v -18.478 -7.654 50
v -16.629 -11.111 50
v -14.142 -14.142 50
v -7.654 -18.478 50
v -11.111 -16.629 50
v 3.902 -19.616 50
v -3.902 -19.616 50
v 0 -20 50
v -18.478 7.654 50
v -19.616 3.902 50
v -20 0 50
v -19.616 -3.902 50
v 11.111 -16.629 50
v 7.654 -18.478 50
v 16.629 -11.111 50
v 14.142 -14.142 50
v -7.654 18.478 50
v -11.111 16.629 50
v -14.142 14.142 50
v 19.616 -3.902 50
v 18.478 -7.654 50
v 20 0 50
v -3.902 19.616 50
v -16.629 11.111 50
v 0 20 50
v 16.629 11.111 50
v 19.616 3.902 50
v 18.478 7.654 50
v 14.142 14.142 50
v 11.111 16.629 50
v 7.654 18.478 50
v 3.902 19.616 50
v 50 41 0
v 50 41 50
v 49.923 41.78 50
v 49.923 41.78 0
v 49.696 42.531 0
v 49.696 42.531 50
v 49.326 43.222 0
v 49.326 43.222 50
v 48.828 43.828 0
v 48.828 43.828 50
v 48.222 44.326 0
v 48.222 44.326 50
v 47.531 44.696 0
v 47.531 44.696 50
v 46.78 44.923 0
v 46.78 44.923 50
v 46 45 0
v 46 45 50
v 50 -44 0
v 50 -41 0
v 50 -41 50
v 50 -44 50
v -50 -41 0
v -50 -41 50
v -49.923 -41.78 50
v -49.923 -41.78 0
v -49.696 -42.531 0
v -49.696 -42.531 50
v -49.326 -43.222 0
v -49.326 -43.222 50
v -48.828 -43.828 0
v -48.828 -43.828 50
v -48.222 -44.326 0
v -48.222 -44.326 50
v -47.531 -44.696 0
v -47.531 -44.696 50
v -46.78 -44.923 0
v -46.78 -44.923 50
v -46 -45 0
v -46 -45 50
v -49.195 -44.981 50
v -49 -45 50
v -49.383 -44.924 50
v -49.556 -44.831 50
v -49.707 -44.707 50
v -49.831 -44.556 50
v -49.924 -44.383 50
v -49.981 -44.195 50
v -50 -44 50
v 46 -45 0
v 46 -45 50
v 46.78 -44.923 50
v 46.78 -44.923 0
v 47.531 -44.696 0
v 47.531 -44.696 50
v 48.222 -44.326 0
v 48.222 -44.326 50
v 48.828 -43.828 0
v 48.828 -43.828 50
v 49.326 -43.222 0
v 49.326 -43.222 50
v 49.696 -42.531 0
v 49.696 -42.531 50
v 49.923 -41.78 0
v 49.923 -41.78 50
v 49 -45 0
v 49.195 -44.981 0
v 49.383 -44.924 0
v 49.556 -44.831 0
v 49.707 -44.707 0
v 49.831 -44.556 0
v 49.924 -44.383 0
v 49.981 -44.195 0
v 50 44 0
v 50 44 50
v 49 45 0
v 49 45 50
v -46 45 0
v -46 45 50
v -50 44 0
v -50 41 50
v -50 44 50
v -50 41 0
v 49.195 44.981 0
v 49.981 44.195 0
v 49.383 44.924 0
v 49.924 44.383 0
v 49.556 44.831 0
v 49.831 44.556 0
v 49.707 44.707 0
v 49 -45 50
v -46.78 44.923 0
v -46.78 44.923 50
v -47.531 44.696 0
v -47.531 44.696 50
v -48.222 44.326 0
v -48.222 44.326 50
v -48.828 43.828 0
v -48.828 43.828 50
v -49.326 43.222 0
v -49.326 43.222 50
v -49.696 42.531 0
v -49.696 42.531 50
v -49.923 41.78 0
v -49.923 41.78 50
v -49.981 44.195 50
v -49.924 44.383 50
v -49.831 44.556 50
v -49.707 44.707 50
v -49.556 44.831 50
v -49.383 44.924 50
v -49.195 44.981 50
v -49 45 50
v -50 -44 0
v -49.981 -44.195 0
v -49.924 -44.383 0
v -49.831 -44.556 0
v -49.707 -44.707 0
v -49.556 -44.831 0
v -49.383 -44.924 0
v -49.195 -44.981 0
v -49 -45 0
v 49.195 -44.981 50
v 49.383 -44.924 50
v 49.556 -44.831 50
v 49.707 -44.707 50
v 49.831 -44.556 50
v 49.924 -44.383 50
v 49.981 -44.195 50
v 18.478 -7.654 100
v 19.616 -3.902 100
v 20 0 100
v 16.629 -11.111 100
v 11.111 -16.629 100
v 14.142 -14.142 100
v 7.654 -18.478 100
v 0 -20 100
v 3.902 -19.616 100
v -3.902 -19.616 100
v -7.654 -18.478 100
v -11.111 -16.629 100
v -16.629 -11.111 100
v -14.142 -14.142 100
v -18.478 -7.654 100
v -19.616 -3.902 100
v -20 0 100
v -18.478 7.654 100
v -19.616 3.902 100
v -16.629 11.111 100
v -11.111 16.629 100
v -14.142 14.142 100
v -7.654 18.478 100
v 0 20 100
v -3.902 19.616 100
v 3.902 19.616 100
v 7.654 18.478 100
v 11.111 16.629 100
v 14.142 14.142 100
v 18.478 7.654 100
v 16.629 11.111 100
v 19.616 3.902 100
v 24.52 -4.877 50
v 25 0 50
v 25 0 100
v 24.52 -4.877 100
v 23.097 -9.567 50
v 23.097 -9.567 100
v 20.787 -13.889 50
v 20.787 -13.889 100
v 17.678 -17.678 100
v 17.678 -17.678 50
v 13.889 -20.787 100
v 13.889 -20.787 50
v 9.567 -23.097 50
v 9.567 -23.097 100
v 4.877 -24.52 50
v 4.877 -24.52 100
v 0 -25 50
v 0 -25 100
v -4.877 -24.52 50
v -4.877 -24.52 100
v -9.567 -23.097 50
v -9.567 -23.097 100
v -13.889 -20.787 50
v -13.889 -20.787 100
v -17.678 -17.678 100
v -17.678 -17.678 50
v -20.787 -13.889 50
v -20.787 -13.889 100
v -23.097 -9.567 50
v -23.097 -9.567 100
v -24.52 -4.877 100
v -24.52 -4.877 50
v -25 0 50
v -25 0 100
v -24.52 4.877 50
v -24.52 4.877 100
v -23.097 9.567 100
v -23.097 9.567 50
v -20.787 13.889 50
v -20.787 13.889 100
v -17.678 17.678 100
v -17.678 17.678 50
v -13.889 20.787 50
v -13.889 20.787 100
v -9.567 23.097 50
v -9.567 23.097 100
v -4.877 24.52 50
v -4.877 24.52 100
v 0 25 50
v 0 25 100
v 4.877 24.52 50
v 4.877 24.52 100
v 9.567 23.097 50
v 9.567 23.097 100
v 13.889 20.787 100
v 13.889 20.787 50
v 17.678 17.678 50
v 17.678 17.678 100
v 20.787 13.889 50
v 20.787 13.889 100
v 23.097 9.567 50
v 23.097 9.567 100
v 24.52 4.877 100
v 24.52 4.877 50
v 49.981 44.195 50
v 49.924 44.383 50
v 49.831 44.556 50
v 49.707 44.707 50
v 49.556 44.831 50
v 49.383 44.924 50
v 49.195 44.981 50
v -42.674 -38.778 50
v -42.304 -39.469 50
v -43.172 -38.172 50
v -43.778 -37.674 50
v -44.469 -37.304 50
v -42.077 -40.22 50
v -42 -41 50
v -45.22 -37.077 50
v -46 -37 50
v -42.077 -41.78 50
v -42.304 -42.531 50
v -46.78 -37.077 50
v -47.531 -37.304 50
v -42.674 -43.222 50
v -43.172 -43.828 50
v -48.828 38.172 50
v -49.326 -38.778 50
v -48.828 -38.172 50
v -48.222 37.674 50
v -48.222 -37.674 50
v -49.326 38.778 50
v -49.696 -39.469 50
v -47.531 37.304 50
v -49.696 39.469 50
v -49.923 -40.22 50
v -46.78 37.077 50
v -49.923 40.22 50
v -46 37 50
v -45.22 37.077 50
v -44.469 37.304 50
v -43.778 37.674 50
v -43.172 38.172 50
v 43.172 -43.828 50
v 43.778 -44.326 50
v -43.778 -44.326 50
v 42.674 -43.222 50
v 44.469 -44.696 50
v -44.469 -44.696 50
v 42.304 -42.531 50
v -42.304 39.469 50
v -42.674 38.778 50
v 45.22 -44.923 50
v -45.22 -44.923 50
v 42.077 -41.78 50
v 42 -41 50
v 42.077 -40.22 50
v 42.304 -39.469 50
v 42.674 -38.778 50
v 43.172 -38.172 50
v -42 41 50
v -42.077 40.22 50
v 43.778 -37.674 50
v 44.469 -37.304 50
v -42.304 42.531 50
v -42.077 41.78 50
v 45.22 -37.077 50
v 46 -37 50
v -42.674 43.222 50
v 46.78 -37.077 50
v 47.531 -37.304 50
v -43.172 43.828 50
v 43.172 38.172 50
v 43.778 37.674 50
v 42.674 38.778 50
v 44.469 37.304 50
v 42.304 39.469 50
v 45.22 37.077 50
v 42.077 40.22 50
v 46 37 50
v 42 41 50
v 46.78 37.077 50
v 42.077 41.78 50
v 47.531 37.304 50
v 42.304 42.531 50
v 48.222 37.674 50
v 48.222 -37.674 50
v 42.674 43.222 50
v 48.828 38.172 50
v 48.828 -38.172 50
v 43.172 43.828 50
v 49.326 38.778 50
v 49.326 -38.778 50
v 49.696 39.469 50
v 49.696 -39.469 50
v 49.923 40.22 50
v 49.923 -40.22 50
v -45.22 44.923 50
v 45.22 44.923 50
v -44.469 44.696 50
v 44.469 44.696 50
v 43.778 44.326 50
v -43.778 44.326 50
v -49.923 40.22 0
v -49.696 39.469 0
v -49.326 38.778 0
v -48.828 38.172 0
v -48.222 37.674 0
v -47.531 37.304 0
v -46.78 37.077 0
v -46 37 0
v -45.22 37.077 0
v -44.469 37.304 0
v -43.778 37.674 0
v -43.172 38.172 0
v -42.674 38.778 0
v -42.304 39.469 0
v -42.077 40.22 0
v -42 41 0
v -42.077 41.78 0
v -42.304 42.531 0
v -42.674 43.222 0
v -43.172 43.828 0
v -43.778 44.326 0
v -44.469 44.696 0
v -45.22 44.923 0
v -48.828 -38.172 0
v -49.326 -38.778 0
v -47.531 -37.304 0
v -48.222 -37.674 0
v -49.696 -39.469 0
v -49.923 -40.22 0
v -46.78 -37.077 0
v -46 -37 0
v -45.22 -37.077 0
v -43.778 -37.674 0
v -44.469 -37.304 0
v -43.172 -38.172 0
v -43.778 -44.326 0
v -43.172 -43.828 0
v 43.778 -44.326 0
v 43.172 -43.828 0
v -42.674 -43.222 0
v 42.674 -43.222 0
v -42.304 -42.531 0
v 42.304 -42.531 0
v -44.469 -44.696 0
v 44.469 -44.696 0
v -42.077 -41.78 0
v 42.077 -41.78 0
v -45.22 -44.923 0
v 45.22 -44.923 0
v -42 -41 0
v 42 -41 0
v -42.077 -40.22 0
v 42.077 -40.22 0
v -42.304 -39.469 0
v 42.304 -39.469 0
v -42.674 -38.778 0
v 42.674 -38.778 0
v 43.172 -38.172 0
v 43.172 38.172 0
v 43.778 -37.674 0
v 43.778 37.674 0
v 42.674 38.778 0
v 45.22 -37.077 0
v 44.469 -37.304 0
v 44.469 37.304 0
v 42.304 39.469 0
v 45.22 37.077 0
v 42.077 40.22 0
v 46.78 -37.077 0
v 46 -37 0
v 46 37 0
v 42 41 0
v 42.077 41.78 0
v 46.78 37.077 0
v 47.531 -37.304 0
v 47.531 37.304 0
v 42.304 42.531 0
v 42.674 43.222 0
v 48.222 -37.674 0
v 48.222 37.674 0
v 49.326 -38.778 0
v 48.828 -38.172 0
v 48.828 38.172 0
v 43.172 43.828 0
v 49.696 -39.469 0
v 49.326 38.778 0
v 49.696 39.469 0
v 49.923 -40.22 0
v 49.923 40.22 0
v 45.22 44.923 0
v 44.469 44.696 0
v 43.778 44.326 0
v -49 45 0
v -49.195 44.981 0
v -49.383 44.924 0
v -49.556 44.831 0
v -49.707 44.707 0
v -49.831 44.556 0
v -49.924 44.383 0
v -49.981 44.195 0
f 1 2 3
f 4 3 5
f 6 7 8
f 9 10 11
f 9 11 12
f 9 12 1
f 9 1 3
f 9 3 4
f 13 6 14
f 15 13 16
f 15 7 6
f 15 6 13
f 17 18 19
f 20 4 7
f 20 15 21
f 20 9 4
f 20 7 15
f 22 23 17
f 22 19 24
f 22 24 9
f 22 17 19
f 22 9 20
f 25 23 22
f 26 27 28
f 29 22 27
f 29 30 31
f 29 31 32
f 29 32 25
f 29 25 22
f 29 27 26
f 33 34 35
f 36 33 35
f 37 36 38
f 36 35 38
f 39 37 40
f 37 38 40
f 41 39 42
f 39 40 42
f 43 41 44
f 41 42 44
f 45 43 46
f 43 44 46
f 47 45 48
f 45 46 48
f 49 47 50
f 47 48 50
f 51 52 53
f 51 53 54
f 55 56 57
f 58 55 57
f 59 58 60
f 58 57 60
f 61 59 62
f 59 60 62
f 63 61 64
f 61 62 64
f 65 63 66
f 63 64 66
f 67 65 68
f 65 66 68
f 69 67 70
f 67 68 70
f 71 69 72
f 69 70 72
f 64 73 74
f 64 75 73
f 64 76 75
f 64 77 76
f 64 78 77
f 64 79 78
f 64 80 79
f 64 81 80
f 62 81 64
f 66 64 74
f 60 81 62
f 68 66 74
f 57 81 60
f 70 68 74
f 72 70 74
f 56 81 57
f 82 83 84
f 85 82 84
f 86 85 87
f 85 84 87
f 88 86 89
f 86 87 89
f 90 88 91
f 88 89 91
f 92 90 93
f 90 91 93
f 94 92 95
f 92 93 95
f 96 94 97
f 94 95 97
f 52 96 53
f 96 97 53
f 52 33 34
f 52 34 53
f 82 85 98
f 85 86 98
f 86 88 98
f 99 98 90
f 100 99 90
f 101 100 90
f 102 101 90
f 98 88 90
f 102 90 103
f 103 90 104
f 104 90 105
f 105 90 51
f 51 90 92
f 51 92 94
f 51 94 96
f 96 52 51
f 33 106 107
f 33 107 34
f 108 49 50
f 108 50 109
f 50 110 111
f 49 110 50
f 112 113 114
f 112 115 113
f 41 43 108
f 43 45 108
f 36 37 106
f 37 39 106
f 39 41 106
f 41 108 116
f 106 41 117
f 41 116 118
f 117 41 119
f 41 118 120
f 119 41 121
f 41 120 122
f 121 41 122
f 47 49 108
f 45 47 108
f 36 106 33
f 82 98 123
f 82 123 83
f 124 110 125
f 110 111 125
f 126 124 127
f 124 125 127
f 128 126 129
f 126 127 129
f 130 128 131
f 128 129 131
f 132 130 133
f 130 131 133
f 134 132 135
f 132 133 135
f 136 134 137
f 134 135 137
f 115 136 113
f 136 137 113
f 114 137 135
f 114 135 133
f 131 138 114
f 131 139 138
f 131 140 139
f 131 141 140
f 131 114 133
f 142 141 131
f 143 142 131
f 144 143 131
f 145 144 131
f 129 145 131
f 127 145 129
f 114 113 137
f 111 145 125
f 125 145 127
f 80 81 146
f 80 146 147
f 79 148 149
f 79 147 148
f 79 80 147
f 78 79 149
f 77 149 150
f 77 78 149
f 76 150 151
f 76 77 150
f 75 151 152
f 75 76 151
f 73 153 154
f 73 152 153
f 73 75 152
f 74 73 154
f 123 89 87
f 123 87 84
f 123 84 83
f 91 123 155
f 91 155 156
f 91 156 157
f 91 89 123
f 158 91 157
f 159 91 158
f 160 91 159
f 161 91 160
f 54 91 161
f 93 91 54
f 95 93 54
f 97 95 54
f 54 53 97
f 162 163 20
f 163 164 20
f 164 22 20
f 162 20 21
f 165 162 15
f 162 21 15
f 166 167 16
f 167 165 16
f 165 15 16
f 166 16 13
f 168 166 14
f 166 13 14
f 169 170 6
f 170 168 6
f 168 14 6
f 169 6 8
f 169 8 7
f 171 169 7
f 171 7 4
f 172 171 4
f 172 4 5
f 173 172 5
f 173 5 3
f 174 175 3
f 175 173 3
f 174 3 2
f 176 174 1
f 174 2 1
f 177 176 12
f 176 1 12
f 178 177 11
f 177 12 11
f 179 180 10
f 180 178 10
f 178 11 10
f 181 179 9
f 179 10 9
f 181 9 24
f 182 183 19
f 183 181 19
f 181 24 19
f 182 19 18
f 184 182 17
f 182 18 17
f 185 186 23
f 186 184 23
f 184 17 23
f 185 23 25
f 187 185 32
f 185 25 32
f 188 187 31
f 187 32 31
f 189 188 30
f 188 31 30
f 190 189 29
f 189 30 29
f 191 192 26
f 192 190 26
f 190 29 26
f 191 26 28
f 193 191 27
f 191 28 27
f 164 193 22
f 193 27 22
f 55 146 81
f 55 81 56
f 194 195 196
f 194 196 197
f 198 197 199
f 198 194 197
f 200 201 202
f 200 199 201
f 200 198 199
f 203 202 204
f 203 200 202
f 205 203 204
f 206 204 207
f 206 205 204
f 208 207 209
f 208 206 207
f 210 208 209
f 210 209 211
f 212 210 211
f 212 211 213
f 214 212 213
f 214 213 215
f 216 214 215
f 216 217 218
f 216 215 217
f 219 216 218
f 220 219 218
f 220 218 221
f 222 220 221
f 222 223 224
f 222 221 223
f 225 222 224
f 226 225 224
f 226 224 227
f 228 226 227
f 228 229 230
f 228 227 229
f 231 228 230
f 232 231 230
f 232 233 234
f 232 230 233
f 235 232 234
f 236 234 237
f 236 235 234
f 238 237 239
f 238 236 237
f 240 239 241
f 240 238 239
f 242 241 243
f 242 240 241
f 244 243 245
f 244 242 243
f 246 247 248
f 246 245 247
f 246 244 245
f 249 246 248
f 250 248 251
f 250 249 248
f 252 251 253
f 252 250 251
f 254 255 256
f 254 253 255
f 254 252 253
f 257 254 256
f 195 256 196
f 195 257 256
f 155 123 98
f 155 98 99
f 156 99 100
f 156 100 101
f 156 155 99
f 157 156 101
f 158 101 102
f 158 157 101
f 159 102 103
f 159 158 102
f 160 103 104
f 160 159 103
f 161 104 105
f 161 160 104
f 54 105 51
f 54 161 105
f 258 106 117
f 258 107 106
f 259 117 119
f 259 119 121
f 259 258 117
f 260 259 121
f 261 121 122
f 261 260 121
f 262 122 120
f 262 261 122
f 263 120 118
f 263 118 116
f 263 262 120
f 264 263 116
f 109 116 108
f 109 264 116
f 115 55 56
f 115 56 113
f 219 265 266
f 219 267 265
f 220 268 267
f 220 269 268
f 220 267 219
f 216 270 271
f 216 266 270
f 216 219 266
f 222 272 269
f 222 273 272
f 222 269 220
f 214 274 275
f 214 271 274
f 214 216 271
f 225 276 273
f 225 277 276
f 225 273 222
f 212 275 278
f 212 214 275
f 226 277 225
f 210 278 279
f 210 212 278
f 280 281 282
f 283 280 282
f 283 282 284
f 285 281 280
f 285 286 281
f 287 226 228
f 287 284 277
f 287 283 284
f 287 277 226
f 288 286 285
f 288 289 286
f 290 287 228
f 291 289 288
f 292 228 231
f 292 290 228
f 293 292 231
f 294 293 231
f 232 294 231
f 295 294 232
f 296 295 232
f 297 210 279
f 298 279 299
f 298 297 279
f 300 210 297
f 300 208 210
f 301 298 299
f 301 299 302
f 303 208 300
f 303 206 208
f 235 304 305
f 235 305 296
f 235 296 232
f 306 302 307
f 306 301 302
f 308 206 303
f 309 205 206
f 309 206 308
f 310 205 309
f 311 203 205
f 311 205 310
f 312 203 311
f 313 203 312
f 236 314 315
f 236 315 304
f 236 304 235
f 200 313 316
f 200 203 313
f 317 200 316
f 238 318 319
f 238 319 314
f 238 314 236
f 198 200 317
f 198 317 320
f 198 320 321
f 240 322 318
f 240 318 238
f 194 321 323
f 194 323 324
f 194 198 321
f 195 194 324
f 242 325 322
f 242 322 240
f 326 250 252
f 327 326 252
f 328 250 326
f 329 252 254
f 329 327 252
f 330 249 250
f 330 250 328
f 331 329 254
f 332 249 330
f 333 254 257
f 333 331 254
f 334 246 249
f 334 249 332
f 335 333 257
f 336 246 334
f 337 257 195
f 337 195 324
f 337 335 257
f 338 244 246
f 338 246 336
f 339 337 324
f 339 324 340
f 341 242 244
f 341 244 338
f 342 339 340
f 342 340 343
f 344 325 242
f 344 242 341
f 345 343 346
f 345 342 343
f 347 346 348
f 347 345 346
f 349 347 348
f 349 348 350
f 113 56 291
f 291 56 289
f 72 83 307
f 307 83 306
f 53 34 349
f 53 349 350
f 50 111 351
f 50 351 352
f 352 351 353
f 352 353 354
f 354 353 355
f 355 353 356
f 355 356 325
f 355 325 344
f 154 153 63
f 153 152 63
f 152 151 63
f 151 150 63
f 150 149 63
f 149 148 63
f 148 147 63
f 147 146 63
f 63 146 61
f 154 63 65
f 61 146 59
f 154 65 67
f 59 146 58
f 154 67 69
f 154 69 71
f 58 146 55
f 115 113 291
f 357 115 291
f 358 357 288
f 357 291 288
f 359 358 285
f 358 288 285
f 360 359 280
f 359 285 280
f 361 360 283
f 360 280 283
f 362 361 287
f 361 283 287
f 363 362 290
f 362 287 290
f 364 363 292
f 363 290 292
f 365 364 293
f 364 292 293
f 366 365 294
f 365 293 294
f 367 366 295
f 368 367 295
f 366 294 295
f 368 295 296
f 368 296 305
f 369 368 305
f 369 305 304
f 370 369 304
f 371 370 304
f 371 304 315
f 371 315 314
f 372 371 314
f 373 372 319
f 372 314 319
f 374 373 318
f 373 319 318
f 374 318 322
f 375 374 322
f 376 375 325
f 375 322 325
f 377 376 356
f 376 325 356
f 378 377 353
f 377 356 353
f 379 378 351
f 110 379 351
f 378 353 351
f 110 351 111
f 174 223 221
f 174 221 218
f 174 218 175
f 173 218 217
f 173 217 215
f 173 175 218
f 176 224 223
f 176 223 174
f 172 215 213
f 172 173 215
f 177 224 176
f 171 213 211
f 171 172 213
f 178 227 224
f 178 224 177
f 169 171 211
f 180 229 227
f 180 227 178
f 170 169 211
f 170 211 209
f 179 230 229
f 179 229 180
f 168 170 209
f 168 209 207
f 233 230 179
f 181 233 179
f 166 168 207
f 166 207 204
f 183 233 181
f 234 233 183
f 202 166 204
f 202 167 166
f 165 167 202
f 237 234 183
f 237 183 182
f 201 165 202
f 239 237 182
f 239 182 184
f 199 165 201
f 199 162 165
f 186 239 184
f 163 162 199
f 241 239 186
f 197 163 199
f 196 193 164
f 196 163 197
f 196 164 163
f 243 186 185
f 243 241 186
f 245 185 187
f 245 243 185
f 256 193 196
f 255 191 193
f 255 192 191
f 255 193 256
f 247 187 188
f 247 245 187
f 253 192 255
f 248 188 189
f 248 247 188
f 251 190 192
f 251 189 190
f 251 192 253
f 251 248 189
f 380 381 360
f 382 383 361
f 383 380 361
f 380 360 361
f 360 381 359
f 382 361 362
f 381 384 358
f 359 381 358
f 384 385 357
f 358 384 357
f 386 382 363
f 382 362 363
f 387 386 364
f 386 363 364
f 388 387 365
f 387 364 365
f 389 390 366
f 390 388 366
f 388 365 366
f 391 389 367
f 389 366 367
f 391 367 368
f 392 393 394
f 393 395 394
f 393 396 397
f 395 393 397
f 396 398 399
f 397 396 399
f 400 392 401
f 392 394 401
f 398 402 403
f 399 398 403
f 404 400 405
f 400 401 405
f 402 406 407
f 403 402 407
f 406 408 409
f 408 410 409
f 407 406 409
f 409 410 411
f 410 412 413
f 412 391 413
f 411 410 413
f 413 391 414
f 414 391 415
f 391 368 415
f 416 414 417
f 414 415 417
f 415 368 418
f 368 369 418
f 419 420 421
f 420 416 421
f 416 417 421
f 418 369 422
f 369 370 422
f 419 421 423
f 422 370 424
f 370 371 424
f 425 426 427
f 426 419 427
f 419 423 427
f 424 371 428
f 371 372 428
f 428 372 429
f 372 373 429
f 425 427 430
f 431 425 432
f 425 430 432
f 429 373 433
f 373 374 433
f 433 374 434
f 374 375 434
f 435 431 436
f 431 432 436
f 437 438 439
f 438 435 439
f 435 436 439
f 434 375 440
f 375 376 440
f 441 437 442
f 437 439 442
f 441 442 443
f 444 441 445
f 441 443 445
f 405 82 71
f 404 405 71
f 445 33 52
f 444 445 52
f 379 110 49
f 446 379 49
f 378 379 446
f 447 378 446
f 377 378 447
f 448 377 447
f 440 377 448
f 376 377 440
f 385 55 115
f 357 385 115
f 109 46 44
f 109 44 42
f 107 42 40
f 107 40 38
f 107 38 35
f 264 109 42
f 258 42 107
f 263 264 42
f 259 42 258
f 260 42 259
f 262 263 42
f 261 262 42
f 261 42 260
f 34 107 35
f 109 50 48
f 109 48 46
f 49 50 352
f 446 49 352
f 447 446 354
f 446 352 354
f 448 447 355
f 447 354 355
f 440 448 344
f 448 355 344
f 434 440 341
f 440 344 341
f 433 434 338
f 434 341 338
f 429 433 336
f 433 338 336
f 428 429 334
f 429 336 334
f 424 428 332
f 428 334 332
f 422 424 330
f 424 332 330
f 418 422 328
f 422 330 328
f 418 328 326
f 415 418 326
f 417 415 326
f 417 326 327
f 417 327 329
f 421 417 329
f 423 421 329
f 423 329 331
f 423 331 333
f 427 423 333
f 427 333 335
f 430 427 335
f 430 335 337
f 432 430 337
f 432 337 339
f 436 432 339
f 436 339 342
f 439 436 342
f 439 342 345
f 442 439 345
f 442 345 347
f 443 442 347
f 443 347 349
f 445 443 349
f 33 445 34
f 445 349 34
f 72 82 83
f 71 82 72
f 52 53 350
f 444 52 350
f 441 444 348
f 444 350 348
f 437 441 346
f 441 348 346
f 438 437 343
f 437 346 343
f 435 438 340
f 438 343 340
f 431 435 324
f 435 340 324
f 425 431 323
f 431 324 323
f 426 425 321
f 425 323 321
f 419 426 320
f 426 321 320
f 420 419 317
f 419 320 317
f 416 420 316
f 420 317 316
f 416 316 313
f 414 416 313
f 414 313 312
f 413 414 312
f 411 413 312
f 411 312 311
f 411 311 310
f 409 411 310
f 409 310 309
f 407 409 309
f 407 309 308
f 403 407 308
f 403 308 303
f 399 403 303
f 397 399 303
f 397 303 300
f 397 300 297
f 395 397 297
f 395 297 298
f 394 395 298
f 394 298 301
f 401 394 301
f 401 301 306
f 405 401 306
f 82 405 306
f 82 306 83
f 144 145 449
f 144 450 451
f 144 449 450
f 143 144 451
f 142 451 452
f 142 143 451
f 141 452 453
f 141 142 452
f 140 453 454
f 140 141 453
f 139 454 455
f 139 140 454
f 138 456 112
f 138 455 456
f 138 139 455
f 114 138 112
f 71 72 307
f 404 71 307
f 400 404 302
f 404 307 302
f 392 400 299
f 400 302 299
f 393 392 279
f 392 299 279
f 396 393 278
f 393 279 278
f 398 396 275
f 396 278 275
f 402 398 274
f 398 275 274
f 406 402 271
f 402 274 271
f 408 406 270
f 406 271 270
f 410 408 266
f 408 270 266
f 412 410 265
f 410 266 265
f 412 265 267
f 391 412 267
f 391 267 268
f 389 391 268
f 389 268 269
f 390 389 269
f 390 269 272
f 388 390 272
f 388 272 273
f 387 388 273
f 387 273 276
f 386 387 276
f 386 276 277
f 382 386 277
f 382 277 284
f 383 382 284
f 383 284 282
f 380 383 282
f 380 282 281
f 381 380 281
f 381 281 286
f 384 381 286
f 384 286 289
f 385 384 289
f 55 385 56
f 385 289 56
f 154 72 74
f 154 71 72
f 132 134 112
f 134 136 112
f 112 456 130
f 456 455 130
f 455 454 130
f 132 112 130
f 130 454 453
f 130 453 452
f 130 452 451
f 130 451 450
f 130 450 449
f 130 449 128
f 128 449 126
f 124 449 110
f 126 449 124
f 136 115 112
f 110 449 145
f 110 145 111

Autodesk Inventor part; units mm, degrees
ref_plane "YZ Plane" through (0, 0, 0) normal (1, 0, 0) x (0, 1, 0)
ref_plane "XZ Plane" through (0, 0, 0) normal (0, 1, 0) x (-1, 0, 0)
ref_plane "XY Plane" through (0, 0, 0) normal (0, 0, 1) x (1, 0, 0)
sketch "Sketch1" plane through (0, 0, 0) normal (0, 0, 1) x (1, 0, 0)
  line L0 (50, -45) -> (-50, -45)
  line L1 (-50, -45) -> (-50, 45)
  line L2 (-50, 45) -> (50, 45)
  line L3 (50, 45) -> (50, -45)
  line L4 (50, -45) -> (-50, 45) construction
  line L5 (-50, -45) -> (50, 45) construction
  point P0 (0, 0)
  dimension "d0" = 100
  dimension "d1" = 90
extrude "Extrusion1" add sketch "Sketch1" along normal blind 50
sketch "Sketch2" plane through (0, 0, 50) normal (0, 0, 1) x (1, 0, 0)
  line L0 (50, -45) -> (50, 45) projected
  line L1 (50, 45) -> (-50, 45) projected
  circle A0 centre (46, 41) radius 4
  circle A1 centre (-46, 41) radius 4
  line L2 (-50, 45) -> (-50, -45) projected
  circle A2 centre (-46, -41) radius 4
  line L3 (-50, -45) -> (50, -45) projected
  circle A3 centre (46, -41) radius 4
  point P0 (0, 0)
extrude "Extrusion2" cut sketch "Sketch2" against normal through all contours A3 | A0 | A2 | A1
sketch "Sketch3" plane through (0, 0, 50) normal (0, 0, 1) x (1, 0, 0)
  circle A0 centre (0, 0) radius 25
  circle A1 centre (0, 0) radius 20
extrude "Extrusion3" add sketch "Sketch3" along normal blind 50
thread "Thread1" size "M50x4" class "6H" standard "ANSI Metric M Profile" length 30
fillet "Fillet1" radius 1 1 edges at (50, 45, 25)
fillet "Fillet2" radius 1 3 edges at (50, -45, 25) (-50, -45, 25) (-50, 45, 25)
properties part number "Práctica1"
